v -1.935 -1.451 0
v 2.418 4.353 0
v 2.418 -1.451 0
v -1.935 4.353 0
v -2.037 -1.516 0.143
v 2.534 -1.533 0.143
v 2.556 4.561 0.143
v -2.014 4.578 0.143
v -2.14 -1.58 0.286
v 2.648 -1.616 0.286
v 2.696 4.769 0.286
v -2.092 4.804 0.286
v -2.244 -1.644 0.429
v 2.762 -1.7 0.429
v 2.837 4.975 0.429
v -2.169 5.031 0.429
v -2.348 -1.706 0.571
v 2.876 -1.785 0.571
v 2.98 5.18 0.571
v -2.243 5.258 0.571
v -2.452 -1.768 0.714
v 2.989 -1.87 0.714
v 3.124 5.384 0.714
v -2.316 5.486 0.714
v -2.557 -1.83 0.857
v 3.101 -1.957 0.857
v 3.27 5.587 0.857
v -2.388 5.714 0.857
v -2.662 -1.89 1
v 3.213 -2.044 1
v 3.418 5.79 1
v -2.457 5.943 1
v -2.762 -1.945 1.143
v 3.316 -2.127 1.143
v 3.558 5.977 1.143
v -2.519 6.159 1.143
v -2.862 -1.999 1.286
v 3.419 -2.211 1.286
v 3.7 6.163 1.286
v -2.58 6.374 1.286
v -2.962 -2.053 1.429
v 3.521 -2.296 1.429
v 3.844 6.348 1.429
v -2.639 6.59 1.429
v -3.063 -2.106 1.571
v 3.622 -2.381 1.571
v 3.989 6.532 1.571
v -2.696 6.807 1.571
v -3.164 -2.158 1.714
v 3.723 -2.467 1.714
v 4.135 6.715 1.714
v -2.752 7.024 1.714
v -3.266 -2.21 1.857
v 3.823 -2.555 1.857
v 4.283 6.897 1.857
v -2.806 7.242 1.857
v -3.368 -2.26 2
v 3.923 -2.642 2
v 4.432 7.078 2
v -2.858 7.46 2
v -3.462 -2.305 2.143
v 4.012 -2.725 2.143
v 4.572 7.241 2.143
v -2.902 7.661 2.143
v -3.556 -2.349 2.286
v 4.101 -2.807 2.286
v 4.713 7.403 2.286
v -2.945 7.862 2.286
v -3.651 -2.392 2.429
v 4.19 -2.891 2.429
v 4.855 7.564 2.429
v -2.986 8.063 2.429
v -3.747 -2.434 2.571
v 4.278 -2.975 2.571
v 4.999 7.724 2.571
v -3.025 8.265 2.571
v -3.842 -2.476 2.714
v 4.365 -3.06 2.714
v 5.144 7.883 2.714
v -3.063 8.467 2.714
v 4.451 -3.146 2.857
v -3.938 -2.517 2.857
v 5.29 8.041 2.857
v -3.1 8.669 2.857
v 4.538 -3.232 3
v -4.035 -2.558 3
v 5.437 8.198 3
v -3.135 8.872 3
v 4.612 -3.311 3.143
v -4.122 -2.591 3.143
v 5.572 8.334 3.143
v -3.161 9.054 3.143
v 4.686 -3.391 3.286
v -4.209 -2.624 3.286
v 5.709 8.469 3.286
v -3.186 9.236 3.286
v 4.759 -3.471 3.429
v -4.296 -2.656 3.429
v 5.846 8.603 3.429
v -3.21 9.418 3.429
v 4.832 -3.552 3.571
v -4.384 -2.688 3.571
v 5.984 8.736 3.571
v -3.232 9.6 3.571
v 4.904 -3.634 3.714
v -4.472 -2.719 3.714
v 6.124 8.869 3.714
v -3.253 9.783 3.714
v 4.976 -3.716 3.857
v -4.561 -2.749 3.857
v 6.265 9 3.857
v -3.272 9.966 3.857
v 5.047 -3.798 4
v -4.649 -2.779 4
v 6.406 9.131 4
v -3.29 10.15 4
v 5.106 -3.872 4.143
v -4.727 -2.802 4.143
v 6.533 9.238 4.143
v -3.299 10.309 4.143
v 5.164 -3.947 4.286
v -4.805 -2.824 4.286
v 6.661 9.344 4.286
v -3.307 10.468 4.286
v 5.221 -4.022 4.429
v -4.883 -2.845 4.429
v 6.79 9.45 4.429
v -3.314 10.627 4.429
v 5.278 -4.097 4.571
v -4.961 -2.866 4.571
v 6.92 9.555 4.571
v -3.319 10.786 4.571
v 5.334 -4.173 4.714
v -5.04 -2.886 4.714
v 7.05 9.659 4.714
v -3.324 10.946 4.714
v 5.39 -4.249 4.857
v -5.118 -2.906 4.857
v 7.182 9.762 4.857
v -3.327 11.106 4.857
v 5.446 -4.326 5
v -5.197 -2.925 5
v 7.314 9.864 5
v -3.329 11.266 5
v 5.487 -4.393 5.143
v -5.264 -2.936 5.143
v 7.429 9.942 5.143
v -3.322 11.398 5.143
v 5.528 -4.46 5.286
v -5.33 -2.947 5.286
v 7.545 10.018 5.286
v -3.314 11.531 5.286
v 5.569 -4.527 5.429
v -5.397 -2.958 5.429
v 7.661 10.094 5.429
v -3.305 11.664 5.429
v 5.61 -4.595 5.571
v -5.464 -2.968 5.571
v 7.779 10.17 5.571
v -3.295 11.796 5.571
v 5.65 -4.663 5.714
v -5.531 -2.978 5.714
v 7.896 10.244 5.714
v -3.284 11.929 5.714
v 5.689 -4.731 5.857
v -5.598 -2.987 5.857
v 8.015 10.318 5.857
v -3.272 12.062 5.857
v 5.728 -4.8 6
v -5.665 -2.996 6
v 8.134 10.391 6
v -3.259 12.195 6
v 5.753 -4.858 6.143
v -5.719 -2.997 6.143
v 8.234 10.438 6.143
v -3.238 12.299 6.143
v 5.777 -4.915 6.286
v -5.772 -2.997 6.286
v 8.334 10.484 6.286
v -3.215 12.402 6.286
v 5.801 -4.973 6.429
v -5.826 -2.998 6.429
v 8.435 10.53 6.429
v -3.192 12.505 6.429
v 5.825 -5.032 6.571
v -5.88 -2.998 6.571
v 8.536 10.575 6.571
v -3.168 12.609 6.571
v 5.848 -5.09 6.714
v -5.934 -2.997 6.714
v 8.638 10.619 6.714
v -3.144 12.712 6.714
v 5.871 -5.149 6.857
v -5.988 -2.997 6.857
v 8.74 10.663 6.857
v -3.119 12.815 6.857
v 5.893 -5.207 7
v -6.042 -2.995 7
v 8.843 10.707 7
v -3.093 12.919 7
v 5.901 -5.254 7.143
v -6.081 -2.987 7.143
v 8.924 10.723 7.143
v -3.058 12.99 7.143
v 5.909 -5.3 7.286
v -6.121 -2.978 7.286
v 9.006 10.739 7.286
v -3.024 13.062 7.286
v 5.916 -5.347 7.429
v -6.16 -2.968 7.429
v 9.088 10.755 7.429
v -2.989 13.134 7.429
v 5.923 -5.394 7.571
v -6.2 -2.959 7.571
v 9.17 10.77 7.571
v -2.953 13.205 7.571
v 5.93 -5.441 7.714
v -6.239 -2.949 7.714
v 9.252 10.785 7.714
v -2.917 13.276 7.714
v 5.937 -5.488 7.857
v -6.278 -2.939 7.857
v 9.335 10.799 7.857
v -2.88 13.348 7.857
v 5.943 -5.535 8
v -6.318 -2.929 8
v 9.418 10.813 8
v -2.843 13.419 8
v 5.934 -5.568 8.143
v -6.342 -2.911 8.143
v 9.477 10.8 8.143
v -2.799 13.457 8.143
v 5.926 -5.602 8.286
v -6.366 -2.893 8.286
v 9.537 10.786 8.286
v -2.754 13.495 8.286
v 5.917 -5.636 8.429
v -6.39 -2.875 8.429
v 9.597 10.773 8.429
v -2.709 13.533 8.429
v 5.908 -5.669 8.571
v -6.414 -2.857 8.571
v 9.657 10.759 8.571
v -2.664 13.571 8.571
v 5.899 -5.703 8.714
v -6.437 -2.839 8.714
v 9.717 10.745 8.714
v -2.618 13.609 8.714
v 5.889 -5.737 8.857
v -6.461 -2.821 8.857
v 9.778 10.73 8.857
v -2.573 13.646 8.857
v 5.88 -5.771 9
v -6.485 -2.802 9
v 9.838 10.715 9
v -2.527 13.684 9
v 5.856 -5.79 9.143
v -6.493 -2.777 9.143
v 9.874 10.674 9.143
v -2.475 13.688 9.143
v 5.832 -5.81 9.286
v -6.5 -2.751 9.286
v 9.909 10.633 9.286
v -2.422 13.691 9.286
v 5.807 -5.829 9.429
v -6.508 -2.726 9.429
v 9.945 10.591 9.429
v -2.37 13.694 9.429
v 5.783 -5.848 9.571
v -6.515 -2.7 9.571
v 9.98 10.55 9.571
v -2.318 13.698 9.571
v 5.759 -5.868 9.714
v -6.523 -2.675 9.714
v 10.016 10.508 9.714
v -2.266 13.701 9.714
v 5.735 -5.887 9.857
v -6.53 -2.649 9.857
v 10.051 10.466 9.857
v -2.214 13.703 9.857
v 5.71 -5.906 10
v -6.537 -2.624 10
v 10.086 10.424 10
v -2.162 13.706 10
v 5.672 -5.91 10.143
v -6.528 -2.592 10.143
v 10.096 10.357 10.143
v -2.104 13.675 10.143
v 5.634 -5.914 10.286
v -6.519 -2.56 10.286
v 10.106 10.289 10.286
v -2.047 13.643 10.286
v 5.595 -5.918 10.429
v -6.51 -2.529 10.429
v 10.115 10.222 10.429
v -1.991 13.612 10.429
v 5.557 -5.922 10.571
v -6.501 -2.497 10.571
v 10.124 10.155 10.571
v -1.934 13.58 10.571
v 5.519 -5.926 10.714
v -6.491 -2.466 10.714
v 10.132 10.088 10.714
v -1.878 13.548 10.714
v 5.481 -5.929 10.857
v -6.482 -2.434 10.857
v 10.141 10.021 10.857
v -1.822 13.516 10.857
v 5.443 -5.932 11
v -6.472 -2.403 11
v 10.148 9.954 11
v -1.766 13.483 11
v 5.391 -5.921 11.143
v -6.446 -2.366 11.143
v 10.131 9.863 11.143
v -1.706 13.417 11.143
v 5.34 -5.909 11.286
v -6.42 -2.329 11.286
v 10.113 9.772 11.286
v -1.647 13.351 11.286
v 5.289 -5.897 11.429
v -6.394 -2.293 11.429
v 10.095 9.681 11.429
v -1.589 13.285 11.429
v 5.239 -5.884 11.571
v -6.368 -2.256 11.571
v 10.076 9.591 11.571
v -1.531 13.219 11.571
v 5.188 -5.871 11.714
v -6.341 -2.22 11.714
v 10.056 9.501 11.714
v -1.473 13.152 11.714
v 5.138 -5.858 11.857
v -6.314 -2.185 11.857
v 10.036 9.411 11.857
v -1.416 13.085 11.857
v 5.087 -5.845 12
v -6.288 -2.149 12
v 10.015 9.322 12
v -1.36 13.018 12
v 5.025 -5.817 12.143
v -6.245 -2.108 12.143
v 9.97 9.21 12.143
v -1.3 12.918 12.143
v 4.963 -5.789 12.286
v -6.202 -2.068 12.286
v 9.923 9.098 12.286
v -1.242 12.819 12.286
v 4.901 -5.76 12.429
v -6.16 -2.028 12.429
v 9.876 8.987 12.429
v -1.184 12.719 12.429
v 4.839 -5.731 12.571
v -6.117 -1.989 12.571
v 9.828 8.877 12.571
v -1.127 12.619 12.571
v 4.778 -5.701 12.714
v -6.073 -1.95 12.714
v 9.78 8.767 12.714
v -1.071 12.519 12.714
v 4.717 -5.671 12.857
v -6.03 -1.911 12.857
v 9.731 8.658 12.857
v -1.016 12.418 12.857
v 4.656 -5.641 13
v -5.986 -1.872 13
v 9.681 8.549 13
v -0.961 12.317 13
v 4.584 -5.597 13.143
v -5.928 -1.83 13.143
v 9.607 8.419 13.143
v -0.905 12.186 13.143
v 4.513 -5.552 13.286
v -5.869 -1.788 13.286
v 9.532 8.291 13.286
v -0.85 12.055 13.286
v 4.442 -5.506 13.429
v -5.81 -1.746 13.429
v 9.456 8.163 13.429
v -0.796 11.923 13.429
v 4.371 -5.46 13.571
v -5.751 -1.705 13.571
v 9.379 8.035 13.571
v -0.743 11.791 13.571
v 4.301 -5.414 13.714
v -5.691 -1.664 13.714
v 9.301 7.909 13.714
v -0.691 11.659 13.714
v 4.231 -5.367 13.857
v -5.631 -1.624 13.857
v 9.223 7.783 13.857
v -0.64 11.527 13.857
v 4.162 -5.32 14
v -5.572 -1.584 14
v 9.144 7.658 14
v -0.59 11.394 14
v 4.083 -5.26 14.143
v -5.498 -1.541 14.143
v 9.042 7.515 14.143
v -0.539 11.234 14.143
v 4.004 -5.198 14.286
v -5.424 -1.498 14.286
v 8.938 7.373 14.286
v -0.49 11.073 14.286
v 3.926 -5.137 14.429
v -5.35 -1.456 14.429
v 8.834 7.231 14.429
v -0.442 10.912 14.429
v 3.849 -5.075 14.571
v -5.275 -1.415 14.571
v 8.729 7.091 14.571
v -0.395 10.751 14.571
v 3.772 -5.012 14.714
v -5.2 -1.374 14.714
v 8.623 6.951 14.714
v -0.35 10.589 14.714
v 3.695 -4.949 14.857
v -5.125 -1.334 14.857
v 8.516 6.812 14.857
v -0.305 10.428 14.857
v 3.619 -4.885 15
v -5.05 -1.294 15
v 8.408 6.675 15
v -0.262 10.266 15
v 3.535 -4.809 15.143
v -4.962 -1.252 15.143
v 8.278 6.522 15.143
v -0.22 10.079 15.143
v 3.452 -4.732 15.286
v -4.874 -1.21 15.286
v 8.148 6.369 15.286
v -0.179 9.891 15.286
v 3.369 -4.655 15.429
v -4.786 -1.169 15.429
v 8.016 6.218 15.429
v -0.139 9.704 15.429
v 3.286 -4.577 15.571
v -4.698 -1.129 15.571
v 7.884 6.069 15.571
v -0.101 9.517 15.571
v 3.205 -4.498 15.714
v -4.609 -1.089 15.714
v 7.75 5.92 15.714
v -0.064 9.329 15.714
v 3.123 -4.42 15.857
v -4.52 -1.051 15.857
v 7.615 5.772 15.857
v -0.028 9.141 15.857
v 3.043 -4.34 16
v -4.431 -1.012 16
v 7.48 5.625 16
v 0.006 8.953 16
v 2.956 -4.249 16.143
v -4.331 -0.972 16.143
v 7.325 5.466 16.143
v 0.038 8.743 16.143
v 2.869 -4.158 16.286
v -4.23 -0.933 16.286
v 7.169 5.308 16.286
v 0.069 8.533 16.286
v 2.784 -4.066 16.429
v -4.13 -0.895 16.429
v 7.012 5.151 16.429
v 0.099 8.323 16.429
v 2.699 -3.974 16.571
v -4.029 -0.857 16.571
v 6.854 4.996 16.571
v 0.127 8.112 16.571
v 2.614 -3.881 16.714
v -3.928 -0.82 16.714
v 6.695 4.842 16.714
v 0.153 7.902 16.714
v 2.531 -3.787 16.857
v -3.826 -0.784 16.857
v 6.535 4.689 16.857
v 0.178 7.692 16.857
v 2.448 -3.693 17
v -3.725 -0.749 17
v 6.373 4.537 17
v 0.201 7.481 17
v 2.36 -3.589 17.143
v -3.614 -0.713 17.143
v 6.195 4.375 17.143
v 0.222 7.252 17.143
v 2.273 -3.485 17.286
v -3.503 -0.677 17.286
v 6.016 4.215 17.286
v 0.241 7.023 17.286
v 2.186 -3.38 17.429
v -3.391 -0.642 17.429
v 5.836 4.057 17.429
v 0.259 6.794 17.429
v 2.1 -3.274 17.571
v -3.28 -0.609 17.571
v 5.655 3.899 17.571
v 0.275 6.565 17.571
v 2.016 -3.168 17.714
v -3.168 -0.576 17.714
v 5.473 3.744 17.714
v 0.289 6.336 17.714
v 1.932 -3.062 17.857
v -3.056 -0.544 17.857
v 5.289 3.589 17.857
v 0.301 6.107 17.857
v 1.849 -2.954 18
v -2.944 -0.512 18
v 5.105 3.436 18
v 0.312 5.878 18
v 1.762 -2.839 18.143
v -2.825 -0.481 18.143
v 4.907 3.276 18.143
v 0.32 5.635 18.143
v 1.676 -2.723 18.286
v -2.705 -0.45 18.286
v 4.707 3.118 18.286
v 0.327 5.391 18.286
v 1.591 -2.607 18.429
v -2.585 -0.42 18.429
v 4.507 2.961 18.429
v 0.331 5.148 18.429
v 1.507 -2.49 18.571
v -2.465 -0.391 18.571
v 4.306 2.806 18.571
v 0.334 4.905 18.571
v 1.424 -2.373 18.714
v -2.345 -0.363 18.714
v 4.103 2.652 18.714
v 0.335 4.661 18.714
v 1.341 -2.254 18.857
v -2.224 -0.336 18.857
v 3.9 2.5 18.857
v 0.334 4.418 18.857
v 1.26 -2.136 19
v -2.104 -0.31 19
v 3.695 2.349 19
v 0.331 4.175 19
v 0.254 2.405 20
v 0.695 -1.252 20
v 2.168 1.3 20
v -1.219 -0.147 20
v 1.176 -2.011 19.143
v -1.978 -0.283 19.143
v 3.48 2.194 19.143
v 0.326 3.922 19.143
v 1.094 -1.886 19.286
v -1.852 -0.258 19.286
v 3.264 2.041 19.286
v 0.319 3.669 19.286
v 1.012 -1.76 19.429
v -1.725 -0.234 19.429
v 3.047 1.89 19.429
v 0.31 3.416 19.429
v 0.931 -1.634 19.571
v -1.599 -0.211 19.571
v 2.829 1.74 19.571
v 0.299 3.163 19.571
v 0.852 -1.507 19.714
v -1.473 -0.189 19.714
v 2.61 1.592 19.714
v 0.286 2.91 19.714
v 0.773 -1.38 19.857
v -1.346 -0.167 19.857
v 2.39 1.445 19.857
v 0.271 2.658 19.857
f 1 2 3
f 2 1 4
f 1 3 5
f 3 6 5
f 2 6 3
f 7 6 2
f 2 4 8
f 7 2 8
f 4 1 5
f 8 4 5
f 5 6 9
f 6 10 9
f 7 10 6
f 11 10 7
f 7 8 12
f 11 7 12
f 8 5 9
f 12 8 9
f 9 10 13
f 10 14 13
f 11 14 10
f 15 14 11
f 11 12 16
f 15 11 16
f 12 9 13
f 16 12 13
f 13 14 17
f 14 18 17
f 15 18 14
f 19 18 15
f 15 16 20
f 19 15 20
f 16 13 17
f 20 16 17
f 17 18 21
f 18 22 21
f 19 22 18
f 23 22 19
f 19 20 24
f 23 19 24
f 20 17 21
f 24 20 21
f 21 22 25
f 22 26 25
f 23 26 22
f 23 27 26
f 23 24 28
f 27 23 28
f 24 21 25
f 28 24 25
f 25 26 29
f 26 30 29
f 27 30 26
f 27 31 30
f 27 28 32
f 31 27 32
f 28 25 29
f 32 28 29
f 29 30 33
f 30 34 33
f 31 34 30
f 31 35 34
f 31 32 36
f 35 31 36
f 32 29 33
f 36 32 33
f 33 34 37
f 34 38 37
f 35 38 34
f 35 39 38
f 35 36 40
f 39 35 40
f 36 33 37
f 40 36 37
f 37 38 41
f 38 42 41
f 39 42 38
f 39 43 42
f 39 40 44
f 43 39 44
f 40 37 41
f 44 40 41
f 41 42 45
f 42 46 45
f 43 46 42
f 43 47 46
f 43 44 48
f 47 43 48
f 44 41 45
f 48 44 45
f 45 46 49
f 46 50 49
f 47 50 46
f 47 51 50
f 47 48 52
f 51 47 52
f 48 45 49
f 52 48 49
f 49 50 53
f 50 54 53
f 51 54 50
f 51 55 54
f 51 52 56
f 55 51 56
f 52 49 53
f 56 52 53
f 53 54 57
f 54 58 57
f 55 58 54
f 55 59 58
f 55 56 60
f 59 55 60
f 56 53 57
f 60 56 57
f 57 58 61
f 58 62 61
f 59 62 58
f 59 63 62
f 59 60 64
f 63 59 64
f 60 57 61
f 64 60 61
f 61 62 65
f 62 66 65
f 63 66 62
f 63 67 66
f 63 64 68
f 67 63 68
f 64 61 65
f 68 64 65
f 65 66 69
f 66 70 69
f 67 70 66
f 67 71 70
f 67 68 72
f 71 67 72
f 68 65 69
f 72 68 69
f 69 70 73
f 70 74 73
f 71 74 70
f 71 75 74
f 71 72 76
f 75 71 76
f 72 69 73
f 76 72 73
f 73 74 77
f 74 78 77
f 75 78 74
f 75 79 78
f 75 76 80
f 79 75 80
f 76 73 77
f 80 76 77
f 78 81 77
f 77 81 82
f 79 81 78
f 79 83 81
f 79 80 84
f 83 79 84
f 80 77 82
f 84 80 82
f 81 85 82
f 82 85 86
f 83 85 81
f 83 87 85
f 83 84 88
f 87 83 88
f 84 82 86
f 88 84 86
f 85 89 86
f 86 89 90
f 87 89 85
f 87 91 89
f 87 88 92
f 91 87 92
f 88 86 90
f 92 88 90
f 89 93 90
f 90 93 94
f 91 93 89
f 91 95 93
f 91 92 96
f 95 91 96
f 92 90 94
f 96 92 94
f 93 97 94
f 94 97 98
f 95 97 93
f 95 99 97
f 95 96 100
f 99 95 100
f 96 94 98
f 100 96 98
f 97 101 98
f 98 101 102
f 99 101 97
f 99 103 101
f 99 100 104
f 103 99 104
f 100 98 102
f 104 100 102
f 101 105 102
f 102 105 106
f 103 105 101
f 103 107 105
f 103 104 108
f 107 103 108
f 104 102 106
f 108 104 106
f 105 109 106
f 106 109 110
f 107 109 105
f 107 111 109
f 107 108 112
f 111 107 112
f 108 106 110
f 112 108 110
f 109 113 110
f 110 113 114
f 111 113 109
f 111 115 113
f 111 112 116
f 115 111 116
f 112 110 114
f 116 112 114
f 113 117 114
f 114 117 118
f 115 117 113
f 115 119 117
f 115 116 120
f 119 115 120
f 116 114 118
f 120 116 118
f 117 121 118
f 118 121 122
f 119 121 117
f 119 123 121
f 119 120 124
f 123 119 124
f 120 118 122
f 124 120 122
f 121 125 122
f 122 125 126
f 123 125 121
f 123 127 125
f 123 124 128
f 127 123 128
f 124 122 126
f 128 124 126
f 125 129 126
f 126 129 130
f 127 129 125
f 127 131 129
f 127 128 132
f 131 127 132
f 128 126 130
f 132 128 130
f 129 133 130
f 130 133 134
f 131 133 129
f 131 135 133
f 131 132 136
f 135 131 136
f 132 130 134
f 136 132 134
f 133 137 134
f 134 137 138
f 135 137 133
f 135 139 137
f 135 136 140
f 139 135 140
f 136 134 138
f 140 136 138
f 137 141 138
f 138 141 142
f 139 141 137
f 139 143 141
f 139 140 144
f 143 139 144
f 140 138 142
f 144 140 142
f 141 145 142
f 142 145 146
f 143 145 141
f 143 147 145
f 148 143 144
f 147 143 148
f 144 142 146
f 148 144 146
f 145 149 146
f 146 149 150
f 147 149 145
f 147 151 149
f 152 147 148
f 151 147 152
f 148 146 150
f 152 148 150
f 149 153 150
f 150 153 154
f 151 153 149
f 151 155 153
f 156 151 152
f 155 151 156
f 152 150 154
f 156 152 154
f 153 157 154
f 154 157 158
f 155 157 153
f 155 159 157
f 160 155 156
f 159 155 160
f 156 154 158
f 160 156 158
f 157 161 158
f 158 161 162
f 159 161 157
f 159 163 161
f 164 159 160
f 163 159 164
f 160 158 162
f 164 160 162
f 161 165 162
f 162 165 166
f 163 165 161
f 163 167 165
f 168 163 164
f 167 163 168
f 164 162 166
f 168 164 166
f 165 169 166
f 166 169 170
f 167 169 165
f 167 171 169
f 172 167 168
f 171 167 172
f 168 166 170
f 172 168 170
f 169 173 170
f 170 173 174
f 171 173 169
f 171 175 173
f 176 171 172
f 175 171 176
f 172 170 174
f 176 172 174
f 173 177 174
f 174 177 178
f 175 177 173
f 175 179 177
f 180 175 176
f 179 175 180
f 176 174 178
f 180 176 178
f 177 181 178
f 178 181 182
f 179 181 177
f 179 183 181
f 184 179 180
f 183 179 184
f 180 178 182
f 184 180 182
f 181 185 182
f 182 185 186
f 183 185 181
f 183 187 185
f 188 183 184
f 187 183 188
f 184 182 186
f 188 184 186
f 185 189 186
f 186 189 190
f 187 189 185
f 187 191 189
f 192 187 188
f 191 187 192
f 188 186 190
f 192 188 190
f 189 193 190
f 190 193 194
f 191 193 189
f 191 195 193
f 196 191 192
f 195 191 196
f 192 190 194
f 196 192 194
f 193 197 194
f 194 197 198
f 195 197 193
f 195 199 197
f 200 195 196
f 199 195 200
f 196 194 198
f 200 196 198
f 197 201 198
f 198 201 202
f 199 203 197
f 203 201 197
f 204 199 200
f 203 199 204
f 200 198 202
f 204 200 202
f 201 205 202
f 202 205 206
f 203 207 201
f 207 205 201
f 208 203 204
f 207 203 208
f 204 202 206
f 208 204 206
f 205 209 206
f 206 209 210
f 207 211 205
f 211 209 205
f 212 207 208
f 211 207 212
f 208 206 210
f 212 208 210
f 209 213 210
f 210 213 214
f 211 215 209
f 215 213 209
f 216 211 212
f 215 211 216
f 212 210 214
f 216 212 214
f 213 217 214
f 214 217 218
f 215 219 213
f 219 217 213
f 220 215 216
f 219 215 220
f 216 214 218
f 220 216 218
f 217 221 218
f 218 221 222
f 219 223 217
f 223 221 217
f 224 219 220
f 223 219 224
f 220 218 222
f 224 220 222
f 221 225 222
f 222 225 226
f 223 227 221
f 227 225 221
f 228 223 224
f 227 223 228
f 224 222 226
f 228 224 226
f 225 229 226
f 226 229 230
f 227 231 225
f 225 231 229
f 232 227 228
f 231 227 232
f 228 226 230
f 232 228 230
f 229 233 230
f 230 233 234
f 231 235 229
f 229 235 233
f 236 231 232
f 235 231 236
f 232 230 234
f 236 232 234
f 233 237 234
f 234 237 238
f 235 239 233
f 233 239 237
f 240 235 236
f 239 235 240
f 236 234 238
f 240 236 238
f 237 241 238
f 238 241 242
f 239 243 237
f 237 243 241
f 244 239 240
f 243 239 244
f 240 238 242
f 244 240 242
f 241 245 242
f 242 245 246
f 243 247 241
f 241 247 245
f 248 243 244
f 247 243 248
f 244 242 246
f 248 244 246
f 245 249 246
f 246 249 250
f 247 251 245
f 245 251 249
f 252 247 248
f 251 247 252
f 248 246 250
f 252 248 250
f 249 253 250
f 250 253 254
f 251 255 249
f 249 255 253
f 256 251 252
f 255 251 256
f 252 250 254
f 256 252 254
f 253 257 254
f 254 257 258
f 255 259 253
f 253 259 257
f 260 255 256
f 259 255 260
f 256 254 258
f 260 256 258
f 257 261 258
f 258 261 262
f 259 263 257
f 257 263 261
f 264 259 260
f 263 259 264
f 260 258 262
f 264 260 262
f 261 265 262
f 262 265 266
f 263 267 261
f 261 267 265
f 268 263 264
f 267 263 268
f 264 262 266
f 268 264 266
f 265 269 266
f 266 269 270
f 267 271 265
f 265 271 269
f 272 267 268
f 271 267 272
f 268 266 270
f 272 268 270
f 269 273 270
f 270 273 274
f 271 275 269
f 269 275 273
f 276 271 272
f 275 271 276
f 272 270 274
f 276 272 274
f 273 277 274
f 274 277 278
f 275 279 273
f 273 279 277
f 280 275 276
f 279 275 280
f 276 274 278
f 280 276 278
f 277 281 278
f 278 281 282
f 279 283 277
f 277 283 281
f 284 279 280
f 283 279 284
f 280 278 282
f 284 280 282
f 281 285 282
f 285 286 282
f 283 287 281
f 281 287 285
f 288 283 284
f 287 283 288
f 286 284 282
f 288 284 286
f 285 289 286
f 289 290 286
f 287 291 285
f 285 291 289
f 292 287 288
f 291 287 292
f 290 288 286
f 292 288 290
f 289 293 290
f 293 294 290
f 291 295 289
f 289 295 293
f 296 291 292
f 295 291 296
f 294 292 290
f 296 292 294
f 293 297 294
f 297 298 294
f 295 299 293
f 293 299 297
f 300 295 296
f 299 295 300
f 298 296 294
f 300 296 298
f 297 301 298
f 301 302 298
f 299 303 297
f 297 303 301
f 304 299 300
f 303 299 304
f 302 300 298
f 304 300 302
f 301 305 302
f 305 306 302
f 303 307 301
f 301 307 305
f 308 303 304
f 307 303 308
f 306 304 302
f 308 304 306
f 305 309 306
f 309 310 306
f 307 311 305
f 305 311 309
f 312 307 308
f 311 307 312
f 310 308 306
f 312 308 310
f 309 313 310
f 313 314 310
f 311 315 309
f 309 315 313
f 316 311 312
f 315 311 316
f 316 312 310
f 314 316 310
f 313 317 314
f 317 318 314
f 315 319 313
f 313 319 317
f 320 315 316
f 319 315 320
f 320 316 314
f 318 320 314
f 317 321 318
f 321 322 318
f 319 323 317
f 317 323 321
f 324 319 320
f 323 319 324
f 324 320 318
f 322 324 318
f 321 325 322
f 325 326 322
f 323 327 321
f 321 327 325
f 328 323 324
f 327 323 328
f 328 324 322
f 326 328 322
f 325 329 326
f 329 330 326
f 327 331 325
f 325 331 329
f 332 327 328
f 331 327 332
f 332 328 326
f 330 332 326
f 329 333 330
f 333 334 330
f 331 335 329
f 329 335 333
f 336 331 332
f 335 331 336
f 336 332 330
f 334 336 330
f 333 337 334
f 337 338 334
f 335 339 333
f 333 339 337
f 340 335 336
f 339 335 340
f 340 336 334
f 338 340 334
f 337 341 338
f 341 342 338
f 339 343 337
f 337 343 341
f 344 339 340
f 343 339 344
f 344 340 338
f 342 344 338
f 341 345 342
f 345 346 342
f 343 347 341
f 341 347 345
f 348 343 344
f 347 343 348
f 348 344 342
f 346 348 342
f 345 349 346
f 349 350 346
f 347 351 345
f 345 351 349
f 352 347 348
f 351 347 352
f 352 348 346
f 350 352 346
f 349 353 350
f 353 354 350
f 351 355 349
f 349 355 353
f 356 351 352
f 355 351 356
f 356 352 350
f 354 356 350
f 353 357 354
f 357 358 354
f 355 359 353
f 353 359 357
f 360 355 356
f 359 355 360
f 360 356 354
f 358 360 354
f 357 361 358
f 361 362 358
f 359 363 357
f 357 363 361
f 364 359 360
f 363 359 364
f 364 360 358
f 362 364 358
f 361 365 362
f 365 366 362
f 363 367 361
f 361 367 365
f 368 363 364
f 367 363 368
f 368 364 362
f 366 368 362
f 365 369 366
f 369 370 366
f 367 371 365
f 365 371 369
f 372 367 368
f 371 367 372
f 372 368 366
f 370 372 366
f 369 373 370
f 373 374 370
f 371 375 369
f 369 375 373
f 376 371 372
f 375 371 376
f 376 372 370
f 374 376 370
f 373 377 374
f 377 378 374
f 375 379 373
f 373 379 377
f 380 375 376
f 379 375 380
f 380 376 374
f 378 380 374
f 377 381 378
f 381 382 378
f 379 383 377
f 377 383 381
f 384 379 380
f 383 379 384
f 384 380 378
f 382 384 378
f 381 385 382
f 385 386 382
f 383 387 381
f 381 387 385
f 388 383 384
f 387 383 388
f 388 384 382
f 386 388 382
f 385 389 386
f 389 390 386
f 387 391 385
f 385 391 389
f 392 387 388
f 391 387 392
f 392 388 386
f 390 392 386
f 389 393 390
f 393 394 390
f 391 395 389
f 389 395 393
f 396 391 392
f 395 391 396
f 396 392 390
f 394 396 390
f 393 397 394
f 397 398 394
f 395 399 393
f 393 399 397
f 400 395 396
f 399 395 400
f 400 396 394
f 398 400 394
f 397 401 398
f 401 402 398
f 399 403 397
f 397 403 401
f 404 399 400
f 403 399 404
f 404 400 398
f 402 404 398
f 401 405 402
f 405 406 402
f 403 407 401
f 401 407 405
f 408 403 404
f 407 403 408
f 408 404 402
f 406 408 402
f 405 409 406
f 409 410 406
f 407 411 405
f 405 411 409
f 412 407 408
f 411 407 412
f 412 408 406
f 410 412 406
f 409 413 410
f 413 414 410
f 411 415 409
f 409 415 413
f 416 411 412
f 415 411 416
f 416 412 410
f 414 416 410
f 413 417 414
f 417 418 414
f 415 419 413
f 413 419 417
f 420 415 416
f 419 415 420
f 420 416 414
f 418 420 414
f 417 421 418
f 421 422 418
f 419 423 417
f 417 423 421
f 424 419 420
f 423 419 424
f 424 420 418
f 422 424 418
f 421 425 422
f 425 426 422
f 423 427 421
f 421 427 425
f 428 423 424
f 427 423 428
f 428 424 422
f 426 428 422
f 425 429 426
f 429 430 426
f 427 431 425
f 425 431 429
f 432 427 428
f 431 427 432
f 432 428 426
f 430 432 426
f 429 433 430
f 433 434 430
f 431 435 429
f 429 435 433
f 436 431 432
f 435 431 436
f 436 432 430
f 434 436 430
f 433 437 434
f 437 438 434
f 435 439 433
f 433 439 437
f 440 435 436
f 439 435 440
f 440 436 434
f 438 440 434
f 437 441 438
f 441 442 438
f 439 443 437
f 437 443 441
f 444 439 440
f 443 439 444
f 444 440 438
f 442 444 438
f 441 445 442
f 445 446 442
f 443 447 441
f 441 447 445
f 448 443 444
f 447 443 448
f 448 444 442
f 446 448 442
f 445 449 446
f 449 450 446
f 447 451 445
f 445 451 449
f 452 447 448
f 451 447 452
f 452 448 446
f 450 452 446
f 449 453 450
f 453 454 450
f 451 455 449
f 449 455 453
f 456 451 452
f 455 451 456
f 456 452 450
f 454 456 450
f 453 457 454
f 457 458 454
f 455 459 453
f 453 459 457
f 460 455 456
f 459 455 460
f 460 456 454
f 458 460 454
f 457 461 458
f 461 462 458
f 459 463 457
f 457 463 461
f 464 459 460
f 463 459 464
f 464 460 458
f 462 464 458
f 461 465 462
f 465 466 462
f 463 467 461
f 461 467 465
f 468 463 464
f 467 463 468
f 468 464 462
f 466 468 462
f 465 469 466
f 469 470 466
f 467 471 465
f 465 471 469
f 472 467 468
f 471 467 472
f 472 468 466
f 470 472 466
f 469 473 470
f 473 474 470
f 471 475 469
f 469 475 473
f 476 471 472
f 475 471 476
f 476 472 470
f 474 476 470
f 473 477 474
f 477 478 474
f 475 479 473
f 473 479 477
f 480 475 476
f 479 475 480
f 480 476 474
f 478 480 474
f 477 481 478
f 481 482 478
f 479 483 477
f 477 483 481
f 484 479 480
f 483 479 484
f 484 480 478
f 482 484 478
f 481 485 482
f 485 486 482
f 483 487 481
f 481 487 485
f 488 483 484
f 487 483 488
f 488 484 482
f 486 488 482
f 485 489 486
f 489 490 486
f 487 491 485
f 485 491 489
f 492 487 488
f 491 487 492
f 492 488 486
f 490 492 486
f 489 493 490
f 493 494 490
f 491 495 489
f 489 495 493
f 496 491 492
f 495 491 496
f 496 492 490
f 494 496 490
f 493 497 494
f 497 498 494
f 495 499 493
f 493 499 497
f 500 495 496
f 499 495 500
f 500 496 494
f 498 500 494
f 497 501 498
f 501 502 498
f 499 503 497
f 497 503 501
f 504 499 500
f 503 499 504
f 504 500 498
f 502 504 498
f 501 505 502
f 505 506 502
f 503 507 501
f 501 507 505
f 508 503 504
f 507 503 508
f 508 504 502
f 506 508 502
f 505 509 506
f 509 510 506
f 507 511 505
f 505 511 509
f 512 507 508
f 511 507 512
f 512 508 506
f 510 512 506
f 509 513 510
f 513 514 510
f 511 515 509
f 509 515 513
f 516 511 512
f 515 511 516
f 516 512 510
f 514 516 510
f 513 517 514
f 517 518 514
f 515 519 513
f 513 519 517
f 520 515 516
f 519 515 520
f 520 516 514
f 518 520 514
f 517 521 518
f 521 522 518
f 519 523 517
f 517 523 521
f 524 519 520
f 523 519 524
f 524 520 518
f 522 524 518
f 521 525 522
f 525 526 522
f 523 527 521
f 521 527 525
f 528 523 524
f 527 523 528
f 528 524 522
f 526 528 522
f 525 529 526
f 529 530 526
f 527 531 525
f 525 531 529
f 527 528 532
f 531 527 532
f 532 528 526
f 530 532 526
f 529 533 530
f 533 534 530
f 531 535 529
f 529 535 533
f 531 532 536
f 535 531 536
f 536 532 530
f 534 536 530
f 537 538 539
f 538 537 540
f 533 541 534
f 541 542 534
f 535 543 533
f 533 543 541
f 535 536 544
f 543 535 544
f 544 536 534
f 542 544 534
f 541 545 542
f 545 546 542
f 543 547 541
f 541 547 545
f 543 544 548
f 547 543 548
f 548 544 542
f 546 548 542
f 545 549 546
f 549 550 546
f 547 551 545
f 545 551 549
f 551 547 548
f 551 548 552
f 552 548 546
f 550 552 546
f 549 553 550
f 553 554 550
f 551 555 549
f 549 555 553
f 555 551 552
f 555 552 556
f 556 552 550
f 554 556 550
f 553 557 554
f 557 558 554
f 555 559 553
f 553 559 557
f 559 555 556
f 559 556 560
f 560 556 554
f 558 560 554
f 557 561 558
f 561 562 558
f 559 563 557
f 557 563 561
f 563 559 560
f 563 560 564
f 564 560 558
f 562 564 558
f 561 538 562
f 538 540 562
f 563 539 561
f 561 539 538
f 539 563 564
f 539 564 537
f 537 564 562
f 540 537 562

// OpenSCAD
  //Linear Extrude with Scale as an interpolated function
  // This module does not need to be modified, 
  //  - unless default parameters want to be changed 
  //  - or additional parameters want to be forwarded
  module linear_extrude_fs(height=1,isteps=20,twist=0,slices=0){
    //union of piecewise generated extrudes
    union(){  
        for(i = [ 0: 1: isteps-1]){
            //each new piece needs to be adjusted for height
            translate([0,0,i*height/isteps])
              linear_extrude(
                height=height/isteps
                ,twist=twist/isteps
                ,scale=f_lefs((i+1)/isteps)/f_lefs(i/isteps)
                ,slices=slices
              )
                // if a twist constant is defined it is split into pieces
                rotate([0,0,-(i/isteps)*twist])
                  // each new piece starts where the last ended
                  scale(f_lefs(i/isteps))
                    children();
        }
    }
  }
  // This function defines the scale function
  //  - Function name must not be modified
  //  - Modify the contents/return value to define the function
  function f_lefs(x) = 
    let(span=150,start=20,normpos=45)
    sin(x*span+start)/sin(normpos);
  
  //Example use
  linear_extrude_fs(height=20,twist=30,slices=7)
    translate([-4,-3])
      square([9,12]);
